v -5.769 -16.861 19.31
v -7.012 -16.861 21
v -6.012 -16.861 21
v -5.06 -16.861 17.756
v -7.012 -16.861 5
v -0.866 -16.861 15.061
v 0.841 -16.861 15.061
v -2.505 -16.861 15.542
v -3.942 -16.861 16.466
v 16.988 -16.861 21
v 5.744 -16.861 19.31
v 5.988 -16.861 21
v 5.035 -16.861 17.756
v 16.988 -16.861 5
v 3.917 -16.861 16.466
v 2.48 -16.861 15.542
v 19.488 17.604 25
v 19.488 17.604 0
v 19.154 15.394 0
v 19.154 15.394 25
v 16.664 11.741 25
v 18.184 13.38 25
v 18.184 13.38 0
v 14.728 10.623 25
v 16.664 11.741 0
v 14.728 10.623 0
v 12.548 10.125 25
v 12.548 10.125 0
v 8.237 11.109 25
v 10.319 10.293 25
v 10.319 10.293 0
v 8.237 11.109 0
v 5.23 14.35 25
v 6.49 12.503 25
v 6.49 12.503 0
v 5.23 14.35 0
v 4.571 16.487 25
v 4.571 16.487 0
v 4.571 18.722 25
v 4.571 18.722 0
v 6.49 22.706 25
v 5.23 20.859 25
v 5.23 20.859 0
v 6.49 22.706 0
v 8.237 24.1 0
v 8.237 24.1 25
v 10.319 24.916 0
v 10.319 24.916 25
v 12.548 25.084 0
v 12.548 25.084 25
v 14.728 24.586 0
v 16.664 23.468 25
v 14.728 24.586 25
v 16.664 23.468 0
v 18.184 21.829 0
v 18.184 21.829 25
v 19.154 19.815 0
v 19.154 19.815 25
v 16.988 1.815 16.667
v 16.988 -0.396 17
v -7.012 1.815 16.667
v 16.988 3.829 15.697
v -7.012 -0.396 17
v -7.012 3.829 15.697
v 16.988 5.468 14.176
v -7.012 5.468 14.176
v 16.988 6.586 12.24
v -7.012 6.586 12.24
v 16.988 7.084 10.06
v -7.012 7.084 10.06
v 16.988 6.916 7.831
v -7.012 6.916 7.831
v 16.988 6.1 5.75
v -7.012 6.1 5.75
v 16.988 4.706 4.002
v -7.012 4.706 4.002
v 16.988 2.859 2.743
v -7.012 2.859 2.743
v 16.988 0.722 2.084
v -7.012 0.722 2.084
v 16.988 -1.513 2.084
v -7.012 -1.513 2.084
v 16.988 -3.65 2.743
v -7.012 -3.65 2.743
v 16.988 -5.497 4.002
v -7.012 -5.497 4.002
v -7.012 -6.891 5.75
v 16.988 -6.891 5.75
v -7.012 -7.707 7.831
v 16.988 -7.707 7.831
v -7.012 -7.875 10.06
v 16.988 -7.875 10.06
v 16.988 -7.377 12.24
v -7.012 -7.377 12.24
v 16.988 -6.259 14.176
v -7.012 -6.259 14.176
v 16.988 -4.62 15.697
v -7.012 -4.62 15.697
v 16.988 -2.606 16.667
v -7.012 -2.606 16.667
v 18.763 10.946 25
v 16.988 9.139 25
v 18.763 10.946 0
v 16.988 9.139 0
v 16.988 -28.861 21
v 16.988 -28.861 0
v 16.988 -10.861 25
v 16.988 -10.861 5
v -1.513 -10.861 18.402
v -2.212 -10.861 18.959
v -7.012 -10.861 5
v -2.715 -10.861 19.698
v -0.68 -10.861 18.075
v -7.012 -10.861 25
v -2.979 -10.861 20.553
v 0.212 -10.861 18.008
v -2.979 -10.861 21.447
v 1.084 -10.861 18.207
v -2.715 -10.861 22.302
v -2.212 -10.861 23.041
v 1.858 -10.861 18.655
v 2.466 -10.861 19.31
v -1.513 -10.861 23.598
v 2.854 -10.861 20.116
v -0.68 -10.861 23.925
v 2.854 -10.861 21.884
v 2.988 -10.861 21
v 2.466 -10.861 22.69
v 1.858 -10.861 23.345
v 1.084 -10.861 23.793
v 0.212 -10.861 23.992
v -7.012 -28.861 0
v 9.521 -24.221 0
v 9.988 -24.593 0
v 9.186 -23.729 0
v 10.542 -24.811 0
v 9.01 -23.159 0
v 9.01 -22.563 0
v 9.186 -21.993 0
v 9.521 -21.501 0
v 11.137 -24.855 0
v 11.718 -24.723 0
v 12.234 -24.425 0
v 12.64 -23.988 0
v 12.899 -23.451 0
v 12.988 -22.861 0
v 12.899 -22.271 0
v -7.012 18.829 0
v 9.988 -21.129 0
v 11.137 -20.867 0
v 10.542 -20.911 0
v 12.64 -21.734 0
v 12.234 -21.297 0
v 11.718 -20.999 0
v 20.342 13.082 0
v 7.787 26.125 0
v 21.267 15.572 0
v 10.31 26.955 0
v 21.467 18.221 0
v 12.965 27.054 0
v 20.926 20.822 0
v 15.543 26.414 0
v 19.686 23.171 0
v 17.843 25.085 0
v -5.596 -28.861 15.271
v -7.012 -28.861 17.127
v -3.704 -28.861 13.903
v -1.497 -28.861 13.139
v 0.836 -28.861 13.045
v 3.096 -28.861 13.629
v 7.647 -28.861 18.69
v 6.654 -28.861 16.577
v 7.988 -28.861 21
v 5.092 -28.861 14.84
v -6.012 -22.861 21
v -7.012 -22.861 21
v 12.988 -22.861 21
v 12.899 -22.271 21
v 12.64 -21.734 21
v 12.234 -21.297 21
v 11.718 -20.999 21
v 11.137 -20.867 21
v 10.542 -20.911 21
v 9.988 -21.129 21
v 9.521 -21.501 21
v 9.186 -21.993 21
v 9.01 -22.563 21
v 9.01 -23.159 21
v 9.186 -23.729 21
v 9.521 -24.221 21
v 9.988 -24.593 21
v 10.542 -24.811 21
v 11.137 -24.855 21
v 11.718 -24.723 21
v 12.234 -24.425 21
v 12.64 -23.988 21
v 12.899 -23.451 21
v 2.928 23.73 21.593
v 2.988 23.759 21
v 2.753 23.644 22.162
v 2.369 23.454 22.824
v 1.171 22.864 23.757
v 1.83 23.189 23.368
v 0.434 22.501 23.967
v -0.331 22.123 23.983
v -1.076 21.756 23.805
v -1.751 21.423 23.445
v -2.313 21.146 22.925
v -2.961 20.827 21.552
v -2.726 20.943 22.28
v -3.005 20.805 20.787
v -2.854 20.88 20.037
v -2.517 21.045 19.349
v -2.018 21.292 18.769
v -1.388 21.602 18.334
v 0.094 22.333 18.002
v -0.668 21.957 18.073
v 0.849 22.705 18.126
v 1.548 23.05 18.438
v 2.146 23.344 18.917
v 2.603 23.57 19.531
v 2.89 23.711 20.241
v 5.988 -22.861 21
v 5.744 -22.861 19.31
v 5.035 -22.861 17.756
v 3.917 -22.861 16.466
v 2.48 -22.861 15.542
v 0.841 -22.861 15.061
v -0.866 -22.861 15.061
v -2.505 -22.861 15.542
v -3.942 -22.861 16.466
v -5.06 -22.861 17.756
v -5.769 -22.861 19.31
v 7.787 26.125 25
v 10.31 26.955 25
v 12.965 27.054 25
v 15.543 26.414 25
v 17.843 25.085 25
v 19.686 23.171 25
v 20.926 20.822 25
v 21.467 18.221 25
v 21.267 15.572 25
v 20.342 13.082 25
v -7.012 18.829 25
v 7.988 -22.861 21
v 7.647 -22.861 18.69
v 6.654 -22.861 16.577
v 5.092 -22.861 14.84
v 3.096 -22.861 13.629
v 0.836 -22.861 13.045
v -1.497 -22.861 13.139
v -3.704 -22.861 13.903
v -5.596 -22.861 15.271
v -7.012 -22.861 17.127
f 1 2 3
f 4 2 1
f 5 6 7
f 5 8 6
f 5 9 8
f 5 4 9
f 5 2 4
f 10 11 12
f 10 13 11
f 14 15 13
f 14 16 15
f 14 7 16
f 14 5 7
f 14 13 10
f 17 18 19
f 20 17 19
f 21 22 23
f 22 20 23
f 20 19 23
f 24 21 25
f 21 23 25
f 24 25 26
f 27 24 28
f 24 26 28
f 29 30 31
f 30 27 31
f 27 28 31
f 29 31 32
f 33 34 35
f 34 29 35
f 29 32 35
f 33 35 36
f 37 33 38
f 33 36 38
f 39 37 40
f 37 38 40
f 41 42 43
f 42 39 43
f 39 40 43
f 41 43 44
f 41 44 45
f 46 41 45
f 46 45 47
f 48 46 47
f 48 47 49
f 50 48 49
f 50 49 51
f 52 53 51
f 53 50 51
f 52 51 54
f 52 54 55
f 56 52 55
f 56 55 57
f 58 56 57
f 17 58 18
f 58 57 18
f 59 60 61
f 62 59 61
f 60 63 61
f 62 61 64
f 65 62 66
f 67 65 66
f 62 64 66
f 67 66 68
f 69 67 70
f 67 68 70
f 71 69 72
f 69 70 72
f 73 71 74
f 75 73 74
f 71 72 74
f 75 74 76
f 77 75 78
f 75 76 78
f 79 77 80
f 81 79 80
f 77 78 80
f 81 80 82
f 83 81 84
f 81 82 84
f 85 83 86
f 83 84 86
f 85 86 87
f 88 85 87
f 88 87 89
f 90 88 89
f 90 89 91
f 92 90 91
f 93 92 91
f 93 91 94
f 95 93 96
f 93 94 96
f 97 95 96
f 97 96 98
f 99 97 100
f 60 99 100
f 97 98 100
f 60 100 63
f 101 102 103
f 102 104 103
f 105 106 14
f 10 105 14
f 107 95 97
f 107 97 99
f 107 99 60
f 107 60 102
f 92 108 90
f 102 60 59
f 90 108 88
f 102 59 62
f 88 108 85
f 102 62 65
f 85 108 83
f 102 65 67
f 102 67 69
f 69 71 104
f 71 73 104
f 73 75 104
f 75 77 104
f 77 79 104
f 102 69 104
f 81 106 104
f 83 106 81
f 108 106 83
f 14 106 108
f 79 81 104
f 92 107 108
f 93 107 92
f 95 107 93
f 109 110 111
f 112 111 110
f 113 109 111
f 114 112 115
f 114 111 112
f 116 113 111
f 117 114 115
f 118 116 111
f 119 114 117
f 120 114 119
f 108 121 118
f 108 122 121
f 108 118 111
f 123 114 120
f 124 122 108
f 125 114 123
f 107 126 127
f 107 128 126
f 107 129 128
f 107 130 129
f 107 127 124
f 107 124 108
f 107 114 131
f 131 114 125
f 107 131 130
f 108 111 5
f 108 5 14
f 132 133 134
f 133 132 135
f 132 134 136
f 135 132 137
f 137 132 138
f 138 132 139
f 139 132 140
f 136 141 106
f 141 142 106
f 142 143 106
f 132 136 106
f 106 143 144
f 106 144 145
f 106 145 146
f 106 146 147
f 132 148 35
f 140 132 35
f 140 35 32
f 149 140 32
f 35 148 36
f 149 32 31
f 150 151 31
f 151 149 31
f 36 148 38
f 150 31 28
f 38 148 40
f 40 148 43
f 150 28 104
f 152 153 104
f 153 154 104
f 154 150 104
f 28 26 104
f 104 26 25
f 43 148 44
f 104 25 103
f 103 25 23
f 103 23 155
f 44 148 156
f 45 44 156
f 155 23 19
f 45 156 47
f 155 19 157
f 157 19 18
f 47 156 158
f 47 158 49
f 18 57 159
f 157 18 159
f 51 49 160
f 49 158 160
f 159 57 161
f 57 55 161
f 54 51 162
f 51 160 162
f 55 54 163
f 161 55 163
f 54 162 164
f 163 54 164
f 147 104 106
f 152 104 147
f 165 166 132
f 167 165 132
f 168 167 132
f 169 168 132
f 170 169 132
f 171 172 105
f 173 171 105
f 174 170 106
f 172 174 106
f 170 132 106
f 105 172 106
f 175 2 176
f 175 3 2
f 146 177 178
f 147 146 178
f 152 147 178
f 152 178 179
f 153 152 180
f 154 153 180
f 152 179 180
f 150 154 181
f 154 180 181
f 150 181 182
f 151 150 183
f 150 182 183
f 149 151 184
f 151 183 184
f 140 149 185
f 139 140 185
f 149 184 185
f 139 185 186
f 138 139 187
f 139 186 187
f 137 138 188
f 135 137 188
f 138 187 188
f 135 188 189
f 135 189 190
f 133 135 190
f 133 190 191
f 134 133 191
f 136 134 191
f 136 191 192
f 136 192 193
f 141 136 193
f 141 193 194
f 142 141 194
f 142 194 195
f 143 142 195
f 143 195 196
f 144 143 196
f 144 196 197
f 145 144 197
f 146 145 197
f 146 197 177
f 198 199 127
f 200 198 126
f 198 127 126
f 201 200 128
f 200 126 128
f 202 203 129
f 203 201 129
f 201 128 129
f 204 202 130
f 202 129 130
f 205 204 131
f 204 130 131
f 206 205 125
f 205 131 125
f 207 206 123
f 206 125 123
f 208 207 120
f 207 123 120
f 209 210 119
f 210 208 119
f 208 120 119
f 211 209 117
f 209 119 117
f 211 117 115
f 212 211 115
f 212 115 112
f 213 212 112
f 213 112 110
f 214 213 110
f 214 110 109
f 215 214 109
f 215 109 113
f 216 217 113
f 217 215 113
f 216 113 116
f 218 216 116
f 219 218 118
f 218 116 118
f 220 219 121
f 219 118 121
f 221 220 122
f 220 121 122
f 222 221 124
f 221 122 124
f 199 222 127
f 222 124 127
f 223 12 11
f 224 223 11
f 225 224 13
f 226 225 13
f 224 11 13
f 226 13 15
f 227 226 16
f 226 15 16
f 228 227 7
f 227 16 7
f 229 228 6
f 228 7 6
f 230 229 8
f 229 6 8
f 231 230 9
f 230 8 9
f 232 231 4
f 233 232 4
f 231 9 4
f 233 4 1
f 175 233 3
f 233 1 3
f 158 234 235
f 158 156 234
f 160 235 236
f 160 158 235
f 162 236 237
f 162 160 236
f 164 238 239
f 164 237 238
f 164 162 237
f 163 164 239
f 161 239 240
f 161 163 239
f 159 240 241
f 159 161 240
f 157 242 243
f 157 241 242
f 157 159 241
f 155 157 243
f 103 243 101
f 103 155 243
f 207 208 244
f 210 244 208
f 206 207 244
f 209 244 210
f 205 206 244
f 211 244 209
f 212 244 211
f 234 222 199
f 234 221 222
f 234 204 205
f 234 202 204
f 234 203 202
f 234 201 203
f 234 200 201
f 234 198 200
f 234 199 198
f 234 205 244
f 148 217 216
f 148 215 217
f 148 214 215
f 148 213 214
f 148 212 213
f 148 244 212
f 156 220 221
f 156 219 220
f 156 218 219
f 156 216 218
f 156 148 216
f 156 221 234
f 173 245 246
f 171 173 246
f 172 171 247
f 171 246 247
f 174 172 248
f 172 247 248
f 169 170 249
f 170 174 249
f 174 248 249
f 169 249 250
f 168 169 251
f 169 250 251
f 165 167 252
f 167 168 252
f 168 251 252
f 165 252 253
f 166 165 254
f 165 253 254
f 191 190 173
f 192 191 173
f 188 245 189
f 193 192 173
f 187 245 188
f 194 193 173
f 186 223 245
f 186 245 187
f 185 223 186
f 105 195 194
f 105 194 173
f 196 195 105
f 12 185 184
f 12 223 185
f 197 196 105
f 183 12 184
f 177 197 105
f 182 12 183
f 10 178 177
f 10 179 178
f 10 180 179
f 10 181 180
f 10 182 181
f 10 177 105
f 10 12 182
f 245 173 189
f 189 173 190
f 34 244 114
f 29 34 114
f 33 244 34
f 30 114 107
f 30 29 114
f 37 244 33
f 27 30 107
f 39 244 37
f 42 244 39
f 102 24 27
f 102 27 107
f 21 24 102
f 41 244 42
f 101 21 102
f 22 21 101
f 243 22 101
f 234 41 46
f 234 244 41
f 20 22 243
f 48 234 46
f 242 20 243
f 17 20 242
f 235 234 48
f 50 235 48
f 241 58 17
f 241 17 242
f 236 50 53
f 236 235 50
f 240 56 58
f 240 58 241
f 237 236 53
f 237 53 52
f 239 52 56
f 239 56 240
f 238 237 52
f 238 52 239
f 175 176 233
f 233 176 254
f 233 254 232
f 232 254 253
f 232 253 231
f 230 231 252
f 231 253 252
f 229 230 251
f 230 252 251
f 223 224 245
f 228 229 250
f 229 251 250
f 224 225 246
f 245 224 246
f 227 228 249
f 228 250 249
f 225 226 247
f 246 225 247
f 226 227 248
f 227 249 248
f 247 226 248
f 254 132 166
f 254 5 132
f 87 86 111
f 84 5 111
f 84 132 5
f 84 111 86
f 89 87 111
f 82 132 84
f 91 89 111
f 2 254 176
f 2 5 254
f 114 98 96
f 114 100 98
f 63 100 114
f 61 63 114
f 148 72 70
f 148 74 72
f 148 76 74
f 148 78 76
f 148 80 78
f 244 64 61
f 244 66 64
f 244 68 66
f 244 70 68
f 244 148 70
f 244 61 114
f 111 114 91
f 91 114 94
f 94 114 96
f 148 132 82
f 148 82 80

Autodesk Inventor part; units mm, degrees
ref_plane "YZ Plane" through (0, 0, 0) normal (1, 0, 0) x (0, 1, 0)
ref_plane "XZ Plane" through (0, 0, 0) normal (0, 1, 0) x (-1, 0, 0)
ref_plane "XY Plane" through (0, 0, 0) normal (0, 0, 1) x (1, 0, 0)
sketch "Sketch1" plane through (0, 0, 0) normal (0, 0, 1) x (1, 0, 0)
  circle A0 centre (11.9875, 17.6045) radius 7.5
  arc A1 (18.7629, 10.9455) -> (7.7868, 26.1253) centre (11.9875, 17.6045) ccw
  line L0 (-8.0125, -7.3955) -> (-0.0125, -7.3955) construction
  line L1 (-0.0125, -7.3955) -> (-0.0125, 4.8295) construction
  line L2 (16.9875, 9.139) -> (16.9875, -32.861)
  line L3 (16.9875, -32.861) -> (-23.0125, -32.861)
  line L4 (-23.0125, -32.861) -> (-23.0125, 10.9414)
  line L5 (37.2097, -0.3955) -> (-34.0078, -0.3955) construction
  line L6 (31.0948, -7.8955) -> (-30.4036, -7.8955) construction
  line L7 (29.7312, 7.1045) -> (-30.4036, 7.1045) construction
  line L8 (-23.0125, 10.9414) -> (7.7868, 26.1253)
  line L9 (16.9875, 9.139) -> (18.7629, 10.9455)
  dimension "d1" = 2
  dimension "d2" = 15
  dimension "d3" = 25
  dimension "d4" = 20
  dimension "d5" = 8
  dimension "d6" = 42
  dimension "d7" = 5
  dimension "d8" = 18
  dimension "d10" = 15
  dimension "d11" = 15
  dimension "d12" = 40
extrude "Extrusion1" add sketch "Sketch1" along normal blind 25
sketch "Sketch2" plane through (-23.0125, -32.861, 0) normal (-1, 0, 0) x (0, 0, 1)
  line L0 (0, 43.8024) -> (0, 0) construction
  line L1 (25, 57.9655) -> (25, 42.9655) construction
  line L2 (0, 42.9655) -> (0, 57.9655) construction
  line L3 (25, 50.4655) -> (0, 50.4655) construction
  line L4 (25, 57.9655) -> (0, 57.9655) construction
  line L5 (25, 42.9655) -> (0, 42.9655) construction
  line L6 (25, 57.9655) -> (25, 42.9655) construction
  line L7 (37.5603, 32.4655) -> (-20.7807, 32.4655) construction
  circle A0 centre (9.5, 32.4655) radius 7.5
  point P0 (0, 32.861)
  dimension "d15" = 15
  dimension "d16" = 15
  dimension "d17" = 15
  dimension "d19" = 18
  dimension "d20" = 9.5
extrude "Y Glide hul" cut sketch "Sketch2" against normal up to surface (40 mm away)
sketch "Sketch25" plane through (0, 0, 25) normal (0, 0, 1) x (1, 0, 0)
  line L0 (-23.0125, -32.861) -> (16.9875, -32.861) projected
  line L1 (-23.0125, 10.9414) -> (-23.0125, -32.861) projected
  line L2 (16.9875, -32.861) -> (-23.0125, -32.861)
  line L3 (-23.0125, -32.861) -> (-23.0125, -10.861)
  line L4 (-23.0125, -10.861) -> (16.9875, -10.861)
  line L5 (16.9875, -10.861) -> (16.9875, -32.861)
  dimension "d150" = 22
extrude "Extrusion23" cut sketch "Sketch25" against normal blind 20
ref_plane "Work Plane7" through (-0.0125, -32.861, 0) normal (-1, 0, 0) x (0, 0, 1)
sketch "Sketch29" plane through (-0.0125, -32.861, 0) normal (-1, 0, 0) x (0, 0, 1)
  line L0 (5, 22) -> (25, 22) construction
  line L1 (25, 43.8024) -> (25, 22) construction
  line L2 (0, 43.8024) -> (25, 43.8024) construction
  line L3 (0, 43.8024) -> (0, 0) construction
  line L4 (0, 0) -> (5, 0) construction
  line L5 (5, 0) -> (5, 22) construction
  circle A0 centre (9.5, 32.4655) radius 7.5 construction
  line L6 (5, 22) -> (5, 0) projected
  line L7 (5, 0) -> (5, 10)
  line L8 (5, 10) -> (15, 10)
  line L9 (15, 10) -> (15, 16)
  line L10 (15, 16) -> (5, 16)
  line L11 (21, 3) -> (21, 19.5032) construction
  point P0 (0, 32.861)
  dimension "d154" = 10
  dimension "d155" = 10
  dimension "d156" = 6
  dimension "d170" = 6
revolve "Revolution2" add sketch "Sketch29" angle 180 mid plane about axis through (-0.0125, -29.861, 21) along (0, 1, 0)
sketch "Sketch30" plane through (5.9875, -22.861, 21) normal (0, -1, 0) x (1, 0, 0)
  line L0 (10, 0) -> (0, 0) projected
  arc A0 (-12, 0) -> (0, 0) centre (-6, 0) ccw projected
  line L1 (-22, 0) -> (-12, 0) projected
  arc A1 (-22, 0) -> (-6, -16) centre (-6, 0) ccw projected
  arc A2 (-6, -16) -> (10, 0) centre (-6, 0) ccw projected
  arc A3 (-12, 0) -> (0, 0) centre (-6, 0) ccw
  line L2 (10, 0) -> (0, 0) projected
  line L3 (10, 0) -> (0, 0)
  line L4 (-12, 0) -> (-22, 0)
  line L5 (11, -16) -> (-29, -16) projected
  line L6 (-29, -21) -> (-29, -16) projected
  line L7 (-29, -21) -> (11, -21) projected
  line L8 (11, -21) -> (11, -16) projected
  line L9 (-22, 0) -> (-22, -16)
  line L10 (-22, -16) -> (-6, -16)
  line L11 (10, 0) -> (10, -16)
  line L12 (10, -16) -> (-6, -16)
  point P0 (-5.9875, -21)
extrude "Extrusion24" add sketch "Sketch30" against normal up to surface (6 mm away) contours A2 A1 L1 A0 L0 | L11 L5 A2 | L5 L9 A1
sketch "Sketch32" plane through (-0.0125, -22.861, 21) normal (0, -1, 0) x (1, 0, 0)
  line L0 (16, 0) -> (6, 0) projected
  arc A0 (-6, 0) -> (6, 0) centre (0, 0) ccw projected
  line L1 (-16, 0) -> (-6, 0) projected
  line L2 (-16, 0) -> (-16, -16) projected
  line L3 (16, -16) -> (-16, -16) projected
  line L4 (16, -16) -> (16, 0) projected
  line L5 (16, -16) -> (16, 0) projected
  line L6 (16, 0) -> (16, -16)
  line L7 (16, -16) -> (-3, -16)
  line L8 (-23, -16) -> (17, -16) projected
  line L9 (-16, 0) -> (-16, -16) projected
  line L10 (-3, -16) -> (-16, -16)
  line L11 (-16, -16) -> (-16, 0)
  arc A1 (-8, 0) -> (8, 0) centre (0, 0) ccw
  line L12 (6, 0) -> (16, 0) projected
  line L13 (16, -16) -> (16, 0) projected
  line L14 (-16, -16) -> (16, -16) projected
  line L15 (-16, 0) -> (-16, -16) projected
  line L16 (-6, 0) -> (-16, 0) projected
  arc A2 (-6, 0) -> (6, 0) centre (0, 0) ccw projected
  point P0 (0.0125, -21)
  dimension "d171" = 16
extrude "Extrusion25" add sketch "Sketch32" along normal up to surface (10 mm away) contours L4 L3 L2 L1 A1 L0
sketch "Sketch35" plane through (15.9875, -32.861, 5) normal (1, 0, 0) x (0, 0, -1)
  line L0 (0, 16) -> (-16, 16) projected
  line L1 (-16, 16) -> (-16, 0) projected
  line L2 (-16, 0) -> (0, 0) projected
  line L3 (0, 16) -> (0, 0) projected
  line L4 (-13, 7) -> (-13, 0) projected
  line L5 (-13, 0) -> (0, 0)
  line L6 (0, 0) -> (0, 16)
  line L7 (0, 16) -> (-13, 16)
  line L8 (-13, 16) -> (-13, 0)
  point P0 (5, 32.861)
extrude "Extrusion26" add sketch "Sketch35" along normal up to surface (1 mm away) contours L3 L2 L4 L8 L0
sketch "Sketch36" plane through (-16.0125, -32.861, 5) normal (-1, 0, 0) x (0, 0, 1)
  line L0 (16, 16) -> (0, 16) projected
  line L1 (0, 0) -> (0, 16) projected
  line L2 (0, 0) -> (16, 0) projected
  line L3 (16, 16) -> (16, 0) projected
  line L4 (16, 10) -> (16, 16) projected
  line L5 (16, 16) -> (0, 16)
  line L6 (0, 16) -> (0, 0)
  line L7 (0, 0) -> (16, 0)
  line L8 (16, 0) -> (16, 16)
  point P0 (-5, 32.861)
extrude "Extrusion27" add sketch "Sketch36" along normal up to surface (7 mm away)
sketch "Sketch38" plane through (-23.0125, -32.861, 0) normal (-1, 0, 0) x (0, 0, 1)
  line L0 (5, 22) -> (25, 22) projected
  line L1 (25, 43.8024) -> (25, 22) projected
  line L2 (0, 43.8024) -> (25, 43.8024) projected
  line L3 (0, 43.8024) -> (0, 0) projected
  line L4 (0, 0) -> (21, 0) projected
  line L5 (21, 16) -> (21, 0) projected
  line L6 (5, 16) -> (21, 16) projected
  line L7 (5, 16) -> (5, 22) projected
  circle A0 centre (9.5, 32.4655) radius 7.5 projected
  line L8 (0, 43.8024) -> (25, 43.8024) projected
  line L9 (0, 43.8024) -> (0, 64.0171)
  line L10 (0, 64.0171) -> (25, 64.0171)
  line L11 (25, 64.0171) -> (25, 43.8024)
  line L12 (5, 43.8024) -> (0, 43.8024)
  line L13 (25, 43.8024) -> (0, 43.8024)
  point P0 (0, 32.861)
extrude "Extrusion28" cut sketch "Sketch38" against normal blind 13
ref_plane "Work Plane8" through (-0.0125, -16.861, 21) normal (0, 1, 0) x (1, 0, 0)
sketch "Sketch39" plane through (-0.0125, -16.861, 21) normal (0, 1, 0) x (1, 0, 0)
  arc A0 (8, 0) -> (-8, 0) centre (0, 0) ccw projected
  line L0 (8, 0) -> (6, 0) projected
  arc A1 (6, 0) -> (-6, 0) centre (0, 0) ccw projected
  line L1 (-8, 0) -> (-6, 0) projected
  circle A2 centre (0, 0) radius 3
  point P0 (0.0125, 21)
  dimension "d173" = 6
extrude "Bowden slange hul" cut sketch "Sketch39" along normal blind 56 contours A2
sketch "Sketch40" plane through (7.9875, -32.861, 21) normal (0, -1, 0) x (1, 0, 0)
  line L0 (-18, 0) -> (-18, -21) projected
  line L1 (-18, -21) -> (9, -21) projected
  line L2 (9, -21) -> (9, -3) projected
  line L3 (8, -3) -> (9, -3) projected
  line L4 (8, 0) -> (8, -3) projected
  line L5 (0, 0) -> (8, 0) projected
  arc A0 (-16, 0) -> (0, 0) centre (-8, 0) ccw projected
  line L6 (-18, 0) -> (-16, 0) projected
  point P0 (-7.9875, -21)
extrude "Extrusion30" cut sketch "Sketch40" against normal blind 4
sketch "Sketch41" plane through (15.9875, -16.861, 18) normal (0, 0, 1) x (1, 0, 0)
  line L0 (0, -12) -> (1, -12) projected
  line L1 (1, -12) -> (1, 0) projected
  line L2 (0, 0) -> (1, 0) projected
  line L3 (0, -12) -> (0, 0) projected
  point P0 (-15.9875, 16.861)
extrude "Extrusion31" add sketch "Sketch41" along normal up to surface (3 mm away)
sketch "Sketch42" plane through (5.9875, -16.861, 21) normal (0, 0, 1) x (1, 0, 0)
  circle A0 centre (5, -6) radius 2
  line L0 (0, 0) -> (11, 0) projected
  line L1 (11, 0) -> (11, -12) projected
  point P0 (-5.9875, 16.861)
  dimension "d180" = 4
  dimension "d181" = 6
  dimension "d182" = 6
extrude "Holder montering" cut sketch "Sketch42" against normal up to surface (21 mm away)
sketch "Sketch43" plane through (-10.0125, -32.861, 0) normal (-1, 0, 0) x (0, 0, 1)
  circle A0 centre (9.5, 32.4655) radius 7.5 projected
  line L0 (0, 4) -> (21, 4) projected
  line L1 (21, 16) -> (21, 4) projected
  line L2 (5, 16) -> (21, 16) projected
  line L3 (5, 22) -> (5, 16) projected
  line L4 (25, 22) -> (5, 22) projected
  line L5 (25, 50.2113) -> (25, 22) projected
  line L6 (0, 50.2113) -> (25, 50.2113) construction
  line L7 (0, 4) -> (0, 50.2113) projected
  line L8 (25, 50.2113) -> (25, 62.2894)
  line L9 (25, 62.2894) -> (0, 62.2894)
  line L10 (0, 50.2113) -> (25, 50.2113) construction
  line L11 (0, 62.2894) -> (0, 50.2113)
  point P0 (0, 32.861)
extrude "Extrusion33" cut sketch "Sketch43" against normal blind 3
equation "\"d11\" = d10"
equation "\"d16\" = d15"
properties part number "Main" material "PLA Plastic"
